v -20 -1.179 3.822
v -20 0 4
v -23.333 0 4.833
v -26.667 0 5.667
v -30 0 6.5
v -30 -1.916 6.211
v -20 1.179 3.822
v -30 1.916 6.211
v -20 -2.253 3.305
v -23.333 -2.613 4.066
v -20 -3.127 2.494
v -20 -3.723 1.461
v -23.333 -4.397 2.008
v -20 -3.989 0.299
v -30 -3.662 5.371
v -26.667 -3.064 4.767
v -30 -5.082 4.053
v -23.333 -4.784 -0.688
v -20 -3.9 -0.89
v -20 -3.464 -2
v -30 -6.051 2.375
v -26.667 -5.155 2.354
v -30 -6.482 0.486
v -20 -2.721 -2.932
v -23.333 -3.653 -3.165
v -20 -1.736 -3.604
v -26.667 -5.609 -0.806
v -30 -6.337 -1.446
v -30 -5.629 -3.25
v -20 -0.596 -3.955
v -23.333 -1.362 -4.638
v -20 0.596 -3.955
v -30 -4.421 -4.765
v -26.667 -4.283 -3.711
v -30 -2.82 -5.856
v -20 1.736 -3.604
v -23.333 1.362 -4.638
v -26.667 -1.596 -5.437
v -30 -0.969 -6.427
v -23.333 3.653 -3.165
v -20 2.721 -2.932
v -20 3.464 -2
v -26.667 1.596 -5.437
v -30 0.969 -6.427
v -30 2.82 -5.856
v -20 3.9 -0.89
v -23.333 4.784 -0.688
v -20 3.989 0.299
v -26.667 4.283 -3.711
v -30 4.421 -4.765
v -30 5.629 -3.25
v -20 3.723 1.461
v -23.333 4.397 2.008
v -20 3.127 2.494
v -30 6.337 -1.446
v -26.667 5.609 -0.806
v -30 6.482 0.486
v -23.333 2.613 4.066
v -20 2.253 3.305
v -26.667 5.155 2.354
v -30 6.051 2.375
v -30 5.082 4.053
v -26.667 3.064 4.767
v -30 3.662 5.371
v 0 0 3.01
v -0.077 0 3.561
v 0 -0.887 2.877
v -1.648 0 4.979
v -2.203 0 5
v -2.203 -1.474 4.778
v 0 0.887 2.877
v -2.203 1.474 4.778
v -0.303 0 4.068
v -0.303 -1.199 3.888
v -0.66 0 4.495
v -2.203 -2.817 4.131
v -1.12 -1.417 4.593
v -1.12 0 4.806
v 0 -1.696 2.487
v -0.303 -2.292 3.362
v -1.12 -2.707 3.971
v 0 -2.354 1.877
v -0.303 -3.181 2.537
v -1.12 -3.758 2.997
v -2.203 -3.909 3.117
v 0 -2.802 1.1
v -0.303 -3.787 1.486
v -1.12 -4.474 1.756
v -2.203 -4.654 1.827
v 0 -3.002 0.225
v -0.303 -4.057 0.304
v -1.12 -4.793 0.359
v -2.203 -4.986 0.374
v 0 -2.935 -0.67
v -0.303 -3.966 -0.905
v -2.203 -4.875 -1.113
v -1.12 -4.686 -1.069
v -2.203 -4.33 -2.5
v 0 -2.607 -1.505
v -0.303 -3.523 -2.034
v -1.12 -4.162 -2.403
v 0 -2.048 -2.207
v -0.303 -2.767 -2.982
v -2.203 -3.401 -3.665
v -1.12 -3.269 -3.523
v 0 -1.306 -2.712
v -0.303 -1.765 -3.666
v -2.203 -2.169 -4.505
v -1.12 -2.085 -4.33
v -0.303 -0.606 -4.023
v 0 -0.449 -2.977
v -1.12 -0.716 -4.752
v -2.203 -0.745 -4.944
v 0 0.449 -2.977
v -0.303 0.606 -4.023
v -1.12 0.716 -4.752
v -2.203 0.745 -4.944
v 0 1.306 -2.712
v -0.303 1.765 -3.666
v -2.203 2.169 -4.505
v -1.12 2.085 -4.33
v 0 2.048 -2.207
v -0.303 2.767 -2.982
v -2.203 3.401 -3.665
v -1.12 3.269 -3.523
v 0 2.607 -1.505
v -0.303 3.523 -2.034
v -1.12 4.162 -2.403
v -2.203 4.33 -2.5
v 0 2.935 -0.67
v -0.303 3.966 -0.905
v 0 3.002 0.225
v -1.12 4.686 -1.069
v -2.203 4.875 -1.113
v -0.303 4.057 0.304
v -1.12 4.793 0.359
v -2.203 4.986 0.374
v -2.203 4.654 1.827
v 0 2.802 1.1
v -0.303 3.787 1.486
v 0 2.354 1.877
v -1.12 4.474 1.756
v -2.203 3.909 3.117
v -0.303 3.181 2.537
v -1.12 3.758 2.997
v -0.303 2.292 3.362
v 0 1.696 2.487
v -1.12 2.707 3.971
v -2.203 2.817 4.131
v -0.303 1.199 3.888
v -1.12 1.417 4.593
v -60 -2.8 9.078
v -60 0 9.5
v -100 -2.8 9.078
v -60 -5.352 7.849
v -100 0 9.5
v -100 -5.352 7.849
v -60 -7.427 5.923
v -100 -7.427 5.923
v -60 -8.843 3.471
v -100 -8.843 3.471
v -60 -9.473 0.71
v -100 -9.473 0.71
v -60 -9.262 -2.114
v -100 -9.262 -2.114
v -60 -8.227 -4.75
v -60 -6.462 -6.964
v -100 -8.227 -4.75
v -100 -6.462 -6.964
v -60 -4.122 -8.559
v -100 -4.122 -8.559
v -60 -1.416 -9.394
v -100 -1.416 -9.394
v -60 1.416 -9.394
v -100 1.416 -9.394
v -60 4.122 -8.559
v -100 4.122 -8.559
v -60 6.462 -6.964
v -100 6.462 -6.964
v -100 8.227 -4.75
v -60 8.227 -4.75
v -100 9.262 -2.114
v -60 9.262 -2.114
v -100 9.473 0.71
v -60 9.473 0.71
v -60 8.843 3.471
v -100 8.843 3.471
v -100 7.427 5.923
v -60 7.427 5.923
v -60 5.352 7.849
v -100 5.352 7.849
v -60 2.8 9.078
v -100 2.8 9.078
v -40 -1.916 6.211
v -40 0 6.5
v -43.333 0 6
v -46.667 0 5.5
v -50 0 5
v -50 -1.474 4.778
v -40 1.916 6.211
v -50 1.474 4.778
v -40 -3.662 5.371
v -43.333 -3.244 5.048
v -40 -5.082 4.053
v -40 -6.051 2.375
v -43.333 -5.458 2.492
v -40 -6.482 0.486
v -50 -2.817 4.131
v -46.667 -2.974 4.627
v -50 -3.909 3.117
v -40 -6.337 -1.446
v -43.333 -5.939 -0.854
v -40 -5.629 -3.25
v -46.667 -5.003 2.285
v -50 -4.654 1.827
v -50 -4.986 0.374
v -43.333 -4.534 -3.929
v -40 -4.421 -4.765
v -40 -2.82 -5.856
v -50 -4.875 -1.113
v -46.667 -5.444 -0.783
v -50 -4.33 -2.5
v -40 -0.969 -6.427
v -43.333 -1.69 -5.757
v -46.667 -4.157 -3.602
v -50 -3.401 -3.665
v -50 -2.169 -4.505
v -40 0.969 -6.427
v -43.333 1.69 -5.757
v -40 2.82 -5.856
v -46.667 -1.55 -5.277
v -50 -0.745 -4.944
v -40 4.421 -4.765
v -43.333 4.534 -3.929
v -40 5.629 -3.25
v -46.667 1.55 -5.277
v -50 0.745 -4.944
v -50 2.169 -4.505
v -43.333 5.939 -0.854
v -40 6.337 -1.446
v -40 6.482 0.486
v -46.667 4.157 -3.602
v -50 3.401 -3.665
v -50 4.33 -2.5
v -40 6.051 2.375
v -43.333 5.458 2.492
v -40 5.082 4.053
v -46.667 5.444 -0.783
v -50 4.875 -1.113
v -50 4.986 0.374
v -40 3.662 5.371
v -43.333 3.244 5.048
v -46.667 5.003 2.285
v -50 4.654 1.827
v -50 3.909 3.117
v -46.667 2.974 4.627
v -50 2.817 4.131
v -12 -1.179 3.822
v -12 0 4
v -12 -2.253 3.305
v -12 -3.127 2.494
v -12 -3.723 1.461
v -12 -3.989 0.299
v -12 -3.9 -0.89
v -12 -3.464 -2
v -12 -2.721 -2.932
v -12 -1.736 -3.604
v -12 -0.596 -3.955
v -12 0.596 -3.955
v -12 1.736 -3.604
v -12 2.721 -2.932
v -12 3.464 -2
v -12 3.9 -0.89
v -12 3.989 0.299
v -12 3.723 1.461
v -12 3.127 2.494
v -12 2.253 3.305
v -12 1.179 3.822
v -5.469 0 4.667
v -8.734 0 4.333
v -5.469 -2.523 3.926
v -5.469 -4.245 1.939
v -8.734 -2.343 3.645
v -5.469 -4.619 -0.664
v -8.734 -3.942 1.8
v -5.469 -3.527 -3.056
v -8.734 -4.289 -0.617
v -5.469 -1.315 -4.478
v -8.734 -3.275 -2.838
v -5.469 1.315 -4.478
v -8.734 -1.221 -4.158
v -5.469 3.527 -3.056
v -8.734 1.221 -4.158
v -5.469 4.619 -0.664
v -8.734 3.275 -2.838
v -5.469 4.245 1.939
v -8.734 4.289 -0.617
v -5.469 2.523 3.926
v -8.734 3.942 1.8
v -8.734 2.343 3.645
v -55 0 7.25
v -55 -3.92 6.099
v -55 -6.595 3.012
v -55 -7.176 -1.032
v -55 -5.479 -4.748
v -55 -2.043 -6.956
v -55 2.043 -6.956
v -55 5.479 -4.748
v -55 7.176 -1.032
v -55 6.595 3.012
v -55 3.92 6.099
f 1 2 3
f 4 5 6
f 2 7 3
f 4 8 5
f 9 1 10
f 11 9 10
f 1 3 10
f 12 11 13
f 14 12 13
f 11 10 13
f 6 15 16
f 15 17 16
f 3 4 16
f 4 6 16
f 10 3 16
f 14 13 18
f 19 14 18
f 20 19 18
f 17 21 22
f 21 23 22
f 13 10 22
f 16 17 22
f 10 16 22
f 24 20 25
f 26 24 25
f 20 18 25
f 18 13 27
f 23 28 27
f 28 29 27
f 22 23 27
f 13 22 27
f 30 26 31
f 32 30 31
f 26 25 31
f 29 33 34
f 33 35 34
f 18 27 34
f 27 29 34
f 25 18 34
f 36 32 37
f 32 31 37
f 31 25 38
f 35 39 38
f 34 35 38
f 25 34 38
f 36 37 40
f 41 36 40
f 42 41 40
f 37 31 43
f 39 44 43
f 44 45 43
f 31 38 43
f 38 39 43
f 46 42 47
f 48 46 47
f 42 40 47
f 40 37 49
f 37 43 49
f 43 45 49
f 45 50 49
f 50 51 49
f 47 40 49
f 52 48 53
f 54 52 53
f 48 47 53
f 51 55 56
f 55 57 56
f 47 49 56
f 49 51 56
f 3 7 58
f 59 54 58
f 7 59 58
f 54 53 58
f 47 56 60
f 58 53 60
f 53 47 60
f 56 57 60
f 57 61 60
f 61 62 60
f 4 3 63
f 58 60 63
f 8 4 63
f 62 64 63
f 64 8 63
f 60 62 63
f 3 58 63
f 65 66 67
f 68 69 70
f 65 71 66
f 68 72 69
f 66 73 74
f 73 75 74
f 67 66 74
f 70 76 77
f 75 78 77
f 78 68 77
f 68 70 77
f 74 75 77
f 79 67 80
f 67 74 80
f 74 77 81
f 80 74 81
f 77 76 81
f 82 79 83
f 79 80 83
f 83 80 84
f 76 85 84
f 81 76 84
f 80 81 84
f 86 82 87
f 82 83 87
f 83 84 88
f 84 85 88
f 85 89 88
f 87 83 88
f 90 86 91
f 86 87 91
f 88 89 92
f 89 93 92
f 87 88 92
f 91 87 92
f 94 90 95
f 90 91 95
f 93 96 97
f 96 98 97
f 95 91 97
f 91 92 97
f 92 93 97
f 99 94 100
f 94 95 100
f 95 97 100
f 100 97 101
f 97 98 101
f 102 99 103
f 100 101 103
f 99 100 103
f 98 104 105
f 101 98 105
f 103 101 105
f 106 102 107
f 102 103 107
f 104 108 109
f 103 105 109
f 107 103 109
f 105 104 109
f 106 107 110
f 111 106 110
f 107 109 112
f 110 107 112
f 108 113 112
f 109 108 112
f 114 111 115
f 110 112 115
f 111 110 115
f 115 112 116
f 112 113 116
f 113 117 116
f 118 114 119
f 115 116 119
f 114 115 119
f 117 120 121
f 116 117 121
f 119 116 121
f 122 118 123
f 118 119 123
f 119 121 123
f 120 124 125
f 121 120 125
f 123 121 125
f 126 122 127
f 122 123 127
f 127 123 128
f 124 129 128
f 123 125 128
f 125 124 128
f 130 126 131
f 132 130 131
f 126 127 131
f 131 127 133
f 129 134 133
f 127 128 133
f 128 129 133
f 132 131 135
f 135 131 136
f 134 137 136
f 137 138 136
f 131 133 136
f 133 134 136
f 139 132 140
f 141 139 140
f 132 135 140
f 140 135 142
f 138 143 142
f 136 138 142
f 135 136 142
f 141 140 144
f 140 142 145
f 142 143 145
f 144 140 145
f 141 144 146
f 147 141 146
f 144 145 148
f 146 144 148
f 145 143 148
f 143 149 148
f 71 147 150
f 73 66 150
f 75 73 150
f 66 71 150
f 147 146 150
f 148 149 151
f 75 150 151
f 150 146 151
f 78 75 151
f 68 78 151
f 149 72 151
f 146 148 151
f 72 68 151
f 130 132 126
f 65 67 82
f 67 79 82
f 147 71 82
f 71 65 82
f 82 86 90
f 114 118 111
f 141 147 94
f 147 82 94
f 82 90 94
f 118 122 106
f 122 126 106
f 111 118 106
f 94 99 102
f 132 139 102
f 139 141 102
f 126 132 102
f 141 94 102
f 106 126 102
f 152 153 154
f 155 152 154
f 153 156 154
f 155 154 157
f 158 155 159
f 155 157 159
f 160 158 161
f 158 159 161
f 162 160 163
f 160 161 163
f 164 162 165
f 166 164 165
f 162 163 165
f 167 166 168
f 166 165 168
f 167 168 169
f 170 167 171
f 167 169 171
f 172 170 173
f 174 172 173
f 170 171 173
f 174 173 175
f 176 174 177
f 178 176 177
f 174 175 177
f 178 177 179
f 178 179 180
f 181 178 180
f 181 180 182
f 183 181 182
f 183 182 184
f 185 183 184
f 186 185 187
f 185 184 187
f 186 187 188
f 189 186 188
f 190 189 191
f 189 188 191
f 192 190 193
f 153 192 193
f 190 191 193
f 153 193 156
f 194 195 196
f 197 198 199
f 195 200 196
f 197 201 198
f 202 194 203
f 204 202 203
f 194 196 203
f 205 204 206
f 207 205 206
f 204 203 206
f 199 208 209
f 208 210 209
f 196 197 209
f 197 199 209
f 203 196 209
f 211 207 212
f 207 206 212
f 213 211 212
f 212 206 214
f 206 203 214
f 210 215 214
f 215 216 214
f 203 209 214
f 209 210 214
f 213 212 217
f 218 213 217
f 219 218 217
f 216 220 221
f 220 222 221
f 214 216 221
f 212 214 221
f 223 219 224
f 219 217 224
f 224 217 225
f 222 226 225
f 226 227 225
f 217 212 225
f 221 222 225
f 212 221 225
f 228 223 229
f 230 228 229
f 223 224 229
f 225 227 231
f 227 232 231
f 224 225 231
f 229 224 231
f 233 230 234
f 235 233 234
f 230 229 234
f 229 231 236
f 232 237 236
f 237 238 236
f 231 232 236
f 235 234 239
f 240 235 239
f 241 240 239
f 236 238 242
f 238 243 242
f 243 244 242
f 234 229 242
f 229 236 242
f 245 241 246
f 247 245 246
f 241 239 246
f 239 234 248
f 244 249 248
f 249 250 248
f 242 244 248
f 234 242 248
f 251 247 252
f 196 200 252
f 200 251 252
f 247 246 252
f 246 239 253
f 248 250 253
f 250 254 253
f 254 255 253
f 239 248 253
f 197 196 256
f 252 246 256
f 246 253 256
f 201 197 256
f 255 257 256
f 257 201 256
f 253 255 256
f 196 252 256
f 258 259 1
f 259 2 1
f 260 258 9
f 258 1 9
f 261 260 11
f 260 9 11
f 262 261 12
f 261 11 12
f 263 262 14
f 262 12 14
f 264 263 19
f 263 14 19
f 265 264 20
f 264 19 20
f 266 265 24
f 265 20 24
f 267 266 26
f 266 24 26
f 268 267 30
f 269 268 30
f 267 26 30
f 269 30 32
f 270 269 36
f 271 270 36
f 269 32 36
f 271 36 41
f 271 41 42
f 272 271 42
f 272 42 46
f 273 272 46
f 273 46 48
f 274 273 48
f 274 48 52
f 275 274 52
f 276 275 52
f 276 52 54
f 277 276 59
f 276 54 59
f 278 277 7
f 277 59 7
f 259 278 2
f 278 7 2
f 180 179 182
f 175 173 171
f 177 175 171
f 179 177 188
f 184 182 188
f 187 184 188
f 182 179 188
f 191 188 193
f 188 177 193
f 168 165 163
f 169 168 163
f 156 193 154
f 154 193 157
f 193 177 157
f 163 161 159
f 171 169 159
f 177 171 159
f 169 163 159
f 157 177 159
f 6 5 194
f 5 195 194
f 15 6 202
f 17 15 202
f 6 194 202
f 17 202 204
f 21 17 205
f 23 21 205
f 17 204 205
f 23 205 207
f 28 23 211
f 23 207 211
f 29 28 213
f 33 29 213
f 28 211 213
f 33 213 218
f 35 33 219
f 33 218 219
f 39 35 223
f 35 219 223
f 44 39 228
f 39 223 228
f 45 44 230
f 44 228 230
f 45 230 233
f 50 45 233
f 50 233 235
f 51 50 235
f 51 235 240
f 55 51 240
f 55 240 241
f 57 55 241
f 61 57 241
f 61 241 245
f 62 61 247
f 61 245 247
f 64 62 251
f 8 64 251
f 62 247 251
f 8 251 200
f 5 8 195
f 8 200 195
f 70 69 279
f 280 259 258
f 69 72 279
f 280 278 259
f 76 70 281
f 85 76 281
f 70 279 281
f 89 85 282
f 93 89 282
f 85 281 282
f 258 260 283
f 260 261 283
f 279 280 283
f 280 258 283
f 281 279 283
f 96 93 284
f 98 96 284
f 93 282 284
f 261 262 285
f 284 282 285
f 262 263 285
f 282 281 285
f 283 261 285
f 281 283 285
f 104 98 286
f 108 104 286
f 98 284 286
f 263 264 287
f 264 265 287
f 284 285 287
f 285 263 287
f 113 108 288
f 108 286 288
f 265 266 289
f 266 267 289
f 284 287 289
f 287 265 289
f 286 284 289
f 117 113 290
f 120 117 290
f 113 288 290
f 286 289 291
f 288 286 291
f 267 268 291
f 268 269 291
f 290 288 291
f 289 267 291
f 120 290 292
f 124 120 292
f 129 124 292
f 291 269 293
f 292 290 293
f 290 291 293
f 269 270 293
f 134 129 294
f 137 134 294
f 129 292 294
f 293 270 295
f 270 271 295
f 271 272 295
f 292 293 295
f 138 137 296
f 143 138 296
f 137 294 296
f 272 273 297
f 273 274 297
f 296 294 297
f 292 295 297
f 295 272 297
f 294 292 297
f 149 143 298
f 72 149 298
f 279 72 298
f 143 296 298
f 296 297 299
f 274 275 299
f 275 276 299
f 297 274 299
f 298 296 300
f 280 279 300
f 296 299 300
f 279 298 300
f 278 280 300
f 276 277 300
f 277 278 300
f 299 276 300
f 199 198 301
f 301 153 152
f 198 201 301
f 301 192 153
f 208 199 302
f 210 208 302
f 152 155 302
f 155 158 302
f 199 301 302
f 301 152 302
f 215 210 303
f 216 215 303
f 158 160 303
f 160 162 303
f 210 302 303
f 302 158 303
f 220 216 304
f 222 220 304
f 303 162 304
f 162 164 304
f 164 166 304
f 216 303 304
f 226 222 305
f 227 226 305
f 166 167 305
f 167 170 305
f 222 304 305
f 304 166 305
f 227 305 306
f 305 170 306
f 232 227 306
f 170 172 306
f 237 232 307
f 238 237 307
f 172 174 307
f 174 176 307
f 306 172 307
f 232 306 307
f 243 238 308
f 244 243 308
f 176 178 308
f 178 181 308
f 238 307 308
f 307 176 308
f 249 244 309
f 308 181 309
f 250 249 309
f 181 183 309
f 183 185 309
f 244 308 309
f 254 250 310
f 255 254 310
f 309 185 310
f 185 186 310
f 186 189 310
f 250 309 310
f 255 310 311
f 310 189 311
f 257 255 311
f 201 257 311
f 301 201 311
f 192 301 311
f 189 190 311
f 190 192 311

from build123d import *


with BuildPart() as f1:
    # F0 (on Front) → F1 (revolve)
    with BuildSketch(Plane.XZ):
        with BuildLine():
            Line((-100, 0), (0, 0))
            Line((0, 0), (0, 3.010338))
            ThreePointArc((0, 3.010338), (-0.659512, 4.494619), (-2.203091, 5))
            Line((-2.203091, 5), (-12, 4))
            Line((-12, 4), (-20, 4))
            Line((-20, 4), (-30, 6.5))
            Line((-30, 6.5), (-40, 6.5))
            Line((-40, 6.5), (-50, 5))
            Line((-50, 5), (-60, 9.5))
            Line((-60, 9.5), (-100, 9.5))
            Line((-100, 9.5), (-100, 0))
        make_face()
    revolve(axis=Axis((-50, 0, 0), (1, 0, 0)))


solid = f1.part
